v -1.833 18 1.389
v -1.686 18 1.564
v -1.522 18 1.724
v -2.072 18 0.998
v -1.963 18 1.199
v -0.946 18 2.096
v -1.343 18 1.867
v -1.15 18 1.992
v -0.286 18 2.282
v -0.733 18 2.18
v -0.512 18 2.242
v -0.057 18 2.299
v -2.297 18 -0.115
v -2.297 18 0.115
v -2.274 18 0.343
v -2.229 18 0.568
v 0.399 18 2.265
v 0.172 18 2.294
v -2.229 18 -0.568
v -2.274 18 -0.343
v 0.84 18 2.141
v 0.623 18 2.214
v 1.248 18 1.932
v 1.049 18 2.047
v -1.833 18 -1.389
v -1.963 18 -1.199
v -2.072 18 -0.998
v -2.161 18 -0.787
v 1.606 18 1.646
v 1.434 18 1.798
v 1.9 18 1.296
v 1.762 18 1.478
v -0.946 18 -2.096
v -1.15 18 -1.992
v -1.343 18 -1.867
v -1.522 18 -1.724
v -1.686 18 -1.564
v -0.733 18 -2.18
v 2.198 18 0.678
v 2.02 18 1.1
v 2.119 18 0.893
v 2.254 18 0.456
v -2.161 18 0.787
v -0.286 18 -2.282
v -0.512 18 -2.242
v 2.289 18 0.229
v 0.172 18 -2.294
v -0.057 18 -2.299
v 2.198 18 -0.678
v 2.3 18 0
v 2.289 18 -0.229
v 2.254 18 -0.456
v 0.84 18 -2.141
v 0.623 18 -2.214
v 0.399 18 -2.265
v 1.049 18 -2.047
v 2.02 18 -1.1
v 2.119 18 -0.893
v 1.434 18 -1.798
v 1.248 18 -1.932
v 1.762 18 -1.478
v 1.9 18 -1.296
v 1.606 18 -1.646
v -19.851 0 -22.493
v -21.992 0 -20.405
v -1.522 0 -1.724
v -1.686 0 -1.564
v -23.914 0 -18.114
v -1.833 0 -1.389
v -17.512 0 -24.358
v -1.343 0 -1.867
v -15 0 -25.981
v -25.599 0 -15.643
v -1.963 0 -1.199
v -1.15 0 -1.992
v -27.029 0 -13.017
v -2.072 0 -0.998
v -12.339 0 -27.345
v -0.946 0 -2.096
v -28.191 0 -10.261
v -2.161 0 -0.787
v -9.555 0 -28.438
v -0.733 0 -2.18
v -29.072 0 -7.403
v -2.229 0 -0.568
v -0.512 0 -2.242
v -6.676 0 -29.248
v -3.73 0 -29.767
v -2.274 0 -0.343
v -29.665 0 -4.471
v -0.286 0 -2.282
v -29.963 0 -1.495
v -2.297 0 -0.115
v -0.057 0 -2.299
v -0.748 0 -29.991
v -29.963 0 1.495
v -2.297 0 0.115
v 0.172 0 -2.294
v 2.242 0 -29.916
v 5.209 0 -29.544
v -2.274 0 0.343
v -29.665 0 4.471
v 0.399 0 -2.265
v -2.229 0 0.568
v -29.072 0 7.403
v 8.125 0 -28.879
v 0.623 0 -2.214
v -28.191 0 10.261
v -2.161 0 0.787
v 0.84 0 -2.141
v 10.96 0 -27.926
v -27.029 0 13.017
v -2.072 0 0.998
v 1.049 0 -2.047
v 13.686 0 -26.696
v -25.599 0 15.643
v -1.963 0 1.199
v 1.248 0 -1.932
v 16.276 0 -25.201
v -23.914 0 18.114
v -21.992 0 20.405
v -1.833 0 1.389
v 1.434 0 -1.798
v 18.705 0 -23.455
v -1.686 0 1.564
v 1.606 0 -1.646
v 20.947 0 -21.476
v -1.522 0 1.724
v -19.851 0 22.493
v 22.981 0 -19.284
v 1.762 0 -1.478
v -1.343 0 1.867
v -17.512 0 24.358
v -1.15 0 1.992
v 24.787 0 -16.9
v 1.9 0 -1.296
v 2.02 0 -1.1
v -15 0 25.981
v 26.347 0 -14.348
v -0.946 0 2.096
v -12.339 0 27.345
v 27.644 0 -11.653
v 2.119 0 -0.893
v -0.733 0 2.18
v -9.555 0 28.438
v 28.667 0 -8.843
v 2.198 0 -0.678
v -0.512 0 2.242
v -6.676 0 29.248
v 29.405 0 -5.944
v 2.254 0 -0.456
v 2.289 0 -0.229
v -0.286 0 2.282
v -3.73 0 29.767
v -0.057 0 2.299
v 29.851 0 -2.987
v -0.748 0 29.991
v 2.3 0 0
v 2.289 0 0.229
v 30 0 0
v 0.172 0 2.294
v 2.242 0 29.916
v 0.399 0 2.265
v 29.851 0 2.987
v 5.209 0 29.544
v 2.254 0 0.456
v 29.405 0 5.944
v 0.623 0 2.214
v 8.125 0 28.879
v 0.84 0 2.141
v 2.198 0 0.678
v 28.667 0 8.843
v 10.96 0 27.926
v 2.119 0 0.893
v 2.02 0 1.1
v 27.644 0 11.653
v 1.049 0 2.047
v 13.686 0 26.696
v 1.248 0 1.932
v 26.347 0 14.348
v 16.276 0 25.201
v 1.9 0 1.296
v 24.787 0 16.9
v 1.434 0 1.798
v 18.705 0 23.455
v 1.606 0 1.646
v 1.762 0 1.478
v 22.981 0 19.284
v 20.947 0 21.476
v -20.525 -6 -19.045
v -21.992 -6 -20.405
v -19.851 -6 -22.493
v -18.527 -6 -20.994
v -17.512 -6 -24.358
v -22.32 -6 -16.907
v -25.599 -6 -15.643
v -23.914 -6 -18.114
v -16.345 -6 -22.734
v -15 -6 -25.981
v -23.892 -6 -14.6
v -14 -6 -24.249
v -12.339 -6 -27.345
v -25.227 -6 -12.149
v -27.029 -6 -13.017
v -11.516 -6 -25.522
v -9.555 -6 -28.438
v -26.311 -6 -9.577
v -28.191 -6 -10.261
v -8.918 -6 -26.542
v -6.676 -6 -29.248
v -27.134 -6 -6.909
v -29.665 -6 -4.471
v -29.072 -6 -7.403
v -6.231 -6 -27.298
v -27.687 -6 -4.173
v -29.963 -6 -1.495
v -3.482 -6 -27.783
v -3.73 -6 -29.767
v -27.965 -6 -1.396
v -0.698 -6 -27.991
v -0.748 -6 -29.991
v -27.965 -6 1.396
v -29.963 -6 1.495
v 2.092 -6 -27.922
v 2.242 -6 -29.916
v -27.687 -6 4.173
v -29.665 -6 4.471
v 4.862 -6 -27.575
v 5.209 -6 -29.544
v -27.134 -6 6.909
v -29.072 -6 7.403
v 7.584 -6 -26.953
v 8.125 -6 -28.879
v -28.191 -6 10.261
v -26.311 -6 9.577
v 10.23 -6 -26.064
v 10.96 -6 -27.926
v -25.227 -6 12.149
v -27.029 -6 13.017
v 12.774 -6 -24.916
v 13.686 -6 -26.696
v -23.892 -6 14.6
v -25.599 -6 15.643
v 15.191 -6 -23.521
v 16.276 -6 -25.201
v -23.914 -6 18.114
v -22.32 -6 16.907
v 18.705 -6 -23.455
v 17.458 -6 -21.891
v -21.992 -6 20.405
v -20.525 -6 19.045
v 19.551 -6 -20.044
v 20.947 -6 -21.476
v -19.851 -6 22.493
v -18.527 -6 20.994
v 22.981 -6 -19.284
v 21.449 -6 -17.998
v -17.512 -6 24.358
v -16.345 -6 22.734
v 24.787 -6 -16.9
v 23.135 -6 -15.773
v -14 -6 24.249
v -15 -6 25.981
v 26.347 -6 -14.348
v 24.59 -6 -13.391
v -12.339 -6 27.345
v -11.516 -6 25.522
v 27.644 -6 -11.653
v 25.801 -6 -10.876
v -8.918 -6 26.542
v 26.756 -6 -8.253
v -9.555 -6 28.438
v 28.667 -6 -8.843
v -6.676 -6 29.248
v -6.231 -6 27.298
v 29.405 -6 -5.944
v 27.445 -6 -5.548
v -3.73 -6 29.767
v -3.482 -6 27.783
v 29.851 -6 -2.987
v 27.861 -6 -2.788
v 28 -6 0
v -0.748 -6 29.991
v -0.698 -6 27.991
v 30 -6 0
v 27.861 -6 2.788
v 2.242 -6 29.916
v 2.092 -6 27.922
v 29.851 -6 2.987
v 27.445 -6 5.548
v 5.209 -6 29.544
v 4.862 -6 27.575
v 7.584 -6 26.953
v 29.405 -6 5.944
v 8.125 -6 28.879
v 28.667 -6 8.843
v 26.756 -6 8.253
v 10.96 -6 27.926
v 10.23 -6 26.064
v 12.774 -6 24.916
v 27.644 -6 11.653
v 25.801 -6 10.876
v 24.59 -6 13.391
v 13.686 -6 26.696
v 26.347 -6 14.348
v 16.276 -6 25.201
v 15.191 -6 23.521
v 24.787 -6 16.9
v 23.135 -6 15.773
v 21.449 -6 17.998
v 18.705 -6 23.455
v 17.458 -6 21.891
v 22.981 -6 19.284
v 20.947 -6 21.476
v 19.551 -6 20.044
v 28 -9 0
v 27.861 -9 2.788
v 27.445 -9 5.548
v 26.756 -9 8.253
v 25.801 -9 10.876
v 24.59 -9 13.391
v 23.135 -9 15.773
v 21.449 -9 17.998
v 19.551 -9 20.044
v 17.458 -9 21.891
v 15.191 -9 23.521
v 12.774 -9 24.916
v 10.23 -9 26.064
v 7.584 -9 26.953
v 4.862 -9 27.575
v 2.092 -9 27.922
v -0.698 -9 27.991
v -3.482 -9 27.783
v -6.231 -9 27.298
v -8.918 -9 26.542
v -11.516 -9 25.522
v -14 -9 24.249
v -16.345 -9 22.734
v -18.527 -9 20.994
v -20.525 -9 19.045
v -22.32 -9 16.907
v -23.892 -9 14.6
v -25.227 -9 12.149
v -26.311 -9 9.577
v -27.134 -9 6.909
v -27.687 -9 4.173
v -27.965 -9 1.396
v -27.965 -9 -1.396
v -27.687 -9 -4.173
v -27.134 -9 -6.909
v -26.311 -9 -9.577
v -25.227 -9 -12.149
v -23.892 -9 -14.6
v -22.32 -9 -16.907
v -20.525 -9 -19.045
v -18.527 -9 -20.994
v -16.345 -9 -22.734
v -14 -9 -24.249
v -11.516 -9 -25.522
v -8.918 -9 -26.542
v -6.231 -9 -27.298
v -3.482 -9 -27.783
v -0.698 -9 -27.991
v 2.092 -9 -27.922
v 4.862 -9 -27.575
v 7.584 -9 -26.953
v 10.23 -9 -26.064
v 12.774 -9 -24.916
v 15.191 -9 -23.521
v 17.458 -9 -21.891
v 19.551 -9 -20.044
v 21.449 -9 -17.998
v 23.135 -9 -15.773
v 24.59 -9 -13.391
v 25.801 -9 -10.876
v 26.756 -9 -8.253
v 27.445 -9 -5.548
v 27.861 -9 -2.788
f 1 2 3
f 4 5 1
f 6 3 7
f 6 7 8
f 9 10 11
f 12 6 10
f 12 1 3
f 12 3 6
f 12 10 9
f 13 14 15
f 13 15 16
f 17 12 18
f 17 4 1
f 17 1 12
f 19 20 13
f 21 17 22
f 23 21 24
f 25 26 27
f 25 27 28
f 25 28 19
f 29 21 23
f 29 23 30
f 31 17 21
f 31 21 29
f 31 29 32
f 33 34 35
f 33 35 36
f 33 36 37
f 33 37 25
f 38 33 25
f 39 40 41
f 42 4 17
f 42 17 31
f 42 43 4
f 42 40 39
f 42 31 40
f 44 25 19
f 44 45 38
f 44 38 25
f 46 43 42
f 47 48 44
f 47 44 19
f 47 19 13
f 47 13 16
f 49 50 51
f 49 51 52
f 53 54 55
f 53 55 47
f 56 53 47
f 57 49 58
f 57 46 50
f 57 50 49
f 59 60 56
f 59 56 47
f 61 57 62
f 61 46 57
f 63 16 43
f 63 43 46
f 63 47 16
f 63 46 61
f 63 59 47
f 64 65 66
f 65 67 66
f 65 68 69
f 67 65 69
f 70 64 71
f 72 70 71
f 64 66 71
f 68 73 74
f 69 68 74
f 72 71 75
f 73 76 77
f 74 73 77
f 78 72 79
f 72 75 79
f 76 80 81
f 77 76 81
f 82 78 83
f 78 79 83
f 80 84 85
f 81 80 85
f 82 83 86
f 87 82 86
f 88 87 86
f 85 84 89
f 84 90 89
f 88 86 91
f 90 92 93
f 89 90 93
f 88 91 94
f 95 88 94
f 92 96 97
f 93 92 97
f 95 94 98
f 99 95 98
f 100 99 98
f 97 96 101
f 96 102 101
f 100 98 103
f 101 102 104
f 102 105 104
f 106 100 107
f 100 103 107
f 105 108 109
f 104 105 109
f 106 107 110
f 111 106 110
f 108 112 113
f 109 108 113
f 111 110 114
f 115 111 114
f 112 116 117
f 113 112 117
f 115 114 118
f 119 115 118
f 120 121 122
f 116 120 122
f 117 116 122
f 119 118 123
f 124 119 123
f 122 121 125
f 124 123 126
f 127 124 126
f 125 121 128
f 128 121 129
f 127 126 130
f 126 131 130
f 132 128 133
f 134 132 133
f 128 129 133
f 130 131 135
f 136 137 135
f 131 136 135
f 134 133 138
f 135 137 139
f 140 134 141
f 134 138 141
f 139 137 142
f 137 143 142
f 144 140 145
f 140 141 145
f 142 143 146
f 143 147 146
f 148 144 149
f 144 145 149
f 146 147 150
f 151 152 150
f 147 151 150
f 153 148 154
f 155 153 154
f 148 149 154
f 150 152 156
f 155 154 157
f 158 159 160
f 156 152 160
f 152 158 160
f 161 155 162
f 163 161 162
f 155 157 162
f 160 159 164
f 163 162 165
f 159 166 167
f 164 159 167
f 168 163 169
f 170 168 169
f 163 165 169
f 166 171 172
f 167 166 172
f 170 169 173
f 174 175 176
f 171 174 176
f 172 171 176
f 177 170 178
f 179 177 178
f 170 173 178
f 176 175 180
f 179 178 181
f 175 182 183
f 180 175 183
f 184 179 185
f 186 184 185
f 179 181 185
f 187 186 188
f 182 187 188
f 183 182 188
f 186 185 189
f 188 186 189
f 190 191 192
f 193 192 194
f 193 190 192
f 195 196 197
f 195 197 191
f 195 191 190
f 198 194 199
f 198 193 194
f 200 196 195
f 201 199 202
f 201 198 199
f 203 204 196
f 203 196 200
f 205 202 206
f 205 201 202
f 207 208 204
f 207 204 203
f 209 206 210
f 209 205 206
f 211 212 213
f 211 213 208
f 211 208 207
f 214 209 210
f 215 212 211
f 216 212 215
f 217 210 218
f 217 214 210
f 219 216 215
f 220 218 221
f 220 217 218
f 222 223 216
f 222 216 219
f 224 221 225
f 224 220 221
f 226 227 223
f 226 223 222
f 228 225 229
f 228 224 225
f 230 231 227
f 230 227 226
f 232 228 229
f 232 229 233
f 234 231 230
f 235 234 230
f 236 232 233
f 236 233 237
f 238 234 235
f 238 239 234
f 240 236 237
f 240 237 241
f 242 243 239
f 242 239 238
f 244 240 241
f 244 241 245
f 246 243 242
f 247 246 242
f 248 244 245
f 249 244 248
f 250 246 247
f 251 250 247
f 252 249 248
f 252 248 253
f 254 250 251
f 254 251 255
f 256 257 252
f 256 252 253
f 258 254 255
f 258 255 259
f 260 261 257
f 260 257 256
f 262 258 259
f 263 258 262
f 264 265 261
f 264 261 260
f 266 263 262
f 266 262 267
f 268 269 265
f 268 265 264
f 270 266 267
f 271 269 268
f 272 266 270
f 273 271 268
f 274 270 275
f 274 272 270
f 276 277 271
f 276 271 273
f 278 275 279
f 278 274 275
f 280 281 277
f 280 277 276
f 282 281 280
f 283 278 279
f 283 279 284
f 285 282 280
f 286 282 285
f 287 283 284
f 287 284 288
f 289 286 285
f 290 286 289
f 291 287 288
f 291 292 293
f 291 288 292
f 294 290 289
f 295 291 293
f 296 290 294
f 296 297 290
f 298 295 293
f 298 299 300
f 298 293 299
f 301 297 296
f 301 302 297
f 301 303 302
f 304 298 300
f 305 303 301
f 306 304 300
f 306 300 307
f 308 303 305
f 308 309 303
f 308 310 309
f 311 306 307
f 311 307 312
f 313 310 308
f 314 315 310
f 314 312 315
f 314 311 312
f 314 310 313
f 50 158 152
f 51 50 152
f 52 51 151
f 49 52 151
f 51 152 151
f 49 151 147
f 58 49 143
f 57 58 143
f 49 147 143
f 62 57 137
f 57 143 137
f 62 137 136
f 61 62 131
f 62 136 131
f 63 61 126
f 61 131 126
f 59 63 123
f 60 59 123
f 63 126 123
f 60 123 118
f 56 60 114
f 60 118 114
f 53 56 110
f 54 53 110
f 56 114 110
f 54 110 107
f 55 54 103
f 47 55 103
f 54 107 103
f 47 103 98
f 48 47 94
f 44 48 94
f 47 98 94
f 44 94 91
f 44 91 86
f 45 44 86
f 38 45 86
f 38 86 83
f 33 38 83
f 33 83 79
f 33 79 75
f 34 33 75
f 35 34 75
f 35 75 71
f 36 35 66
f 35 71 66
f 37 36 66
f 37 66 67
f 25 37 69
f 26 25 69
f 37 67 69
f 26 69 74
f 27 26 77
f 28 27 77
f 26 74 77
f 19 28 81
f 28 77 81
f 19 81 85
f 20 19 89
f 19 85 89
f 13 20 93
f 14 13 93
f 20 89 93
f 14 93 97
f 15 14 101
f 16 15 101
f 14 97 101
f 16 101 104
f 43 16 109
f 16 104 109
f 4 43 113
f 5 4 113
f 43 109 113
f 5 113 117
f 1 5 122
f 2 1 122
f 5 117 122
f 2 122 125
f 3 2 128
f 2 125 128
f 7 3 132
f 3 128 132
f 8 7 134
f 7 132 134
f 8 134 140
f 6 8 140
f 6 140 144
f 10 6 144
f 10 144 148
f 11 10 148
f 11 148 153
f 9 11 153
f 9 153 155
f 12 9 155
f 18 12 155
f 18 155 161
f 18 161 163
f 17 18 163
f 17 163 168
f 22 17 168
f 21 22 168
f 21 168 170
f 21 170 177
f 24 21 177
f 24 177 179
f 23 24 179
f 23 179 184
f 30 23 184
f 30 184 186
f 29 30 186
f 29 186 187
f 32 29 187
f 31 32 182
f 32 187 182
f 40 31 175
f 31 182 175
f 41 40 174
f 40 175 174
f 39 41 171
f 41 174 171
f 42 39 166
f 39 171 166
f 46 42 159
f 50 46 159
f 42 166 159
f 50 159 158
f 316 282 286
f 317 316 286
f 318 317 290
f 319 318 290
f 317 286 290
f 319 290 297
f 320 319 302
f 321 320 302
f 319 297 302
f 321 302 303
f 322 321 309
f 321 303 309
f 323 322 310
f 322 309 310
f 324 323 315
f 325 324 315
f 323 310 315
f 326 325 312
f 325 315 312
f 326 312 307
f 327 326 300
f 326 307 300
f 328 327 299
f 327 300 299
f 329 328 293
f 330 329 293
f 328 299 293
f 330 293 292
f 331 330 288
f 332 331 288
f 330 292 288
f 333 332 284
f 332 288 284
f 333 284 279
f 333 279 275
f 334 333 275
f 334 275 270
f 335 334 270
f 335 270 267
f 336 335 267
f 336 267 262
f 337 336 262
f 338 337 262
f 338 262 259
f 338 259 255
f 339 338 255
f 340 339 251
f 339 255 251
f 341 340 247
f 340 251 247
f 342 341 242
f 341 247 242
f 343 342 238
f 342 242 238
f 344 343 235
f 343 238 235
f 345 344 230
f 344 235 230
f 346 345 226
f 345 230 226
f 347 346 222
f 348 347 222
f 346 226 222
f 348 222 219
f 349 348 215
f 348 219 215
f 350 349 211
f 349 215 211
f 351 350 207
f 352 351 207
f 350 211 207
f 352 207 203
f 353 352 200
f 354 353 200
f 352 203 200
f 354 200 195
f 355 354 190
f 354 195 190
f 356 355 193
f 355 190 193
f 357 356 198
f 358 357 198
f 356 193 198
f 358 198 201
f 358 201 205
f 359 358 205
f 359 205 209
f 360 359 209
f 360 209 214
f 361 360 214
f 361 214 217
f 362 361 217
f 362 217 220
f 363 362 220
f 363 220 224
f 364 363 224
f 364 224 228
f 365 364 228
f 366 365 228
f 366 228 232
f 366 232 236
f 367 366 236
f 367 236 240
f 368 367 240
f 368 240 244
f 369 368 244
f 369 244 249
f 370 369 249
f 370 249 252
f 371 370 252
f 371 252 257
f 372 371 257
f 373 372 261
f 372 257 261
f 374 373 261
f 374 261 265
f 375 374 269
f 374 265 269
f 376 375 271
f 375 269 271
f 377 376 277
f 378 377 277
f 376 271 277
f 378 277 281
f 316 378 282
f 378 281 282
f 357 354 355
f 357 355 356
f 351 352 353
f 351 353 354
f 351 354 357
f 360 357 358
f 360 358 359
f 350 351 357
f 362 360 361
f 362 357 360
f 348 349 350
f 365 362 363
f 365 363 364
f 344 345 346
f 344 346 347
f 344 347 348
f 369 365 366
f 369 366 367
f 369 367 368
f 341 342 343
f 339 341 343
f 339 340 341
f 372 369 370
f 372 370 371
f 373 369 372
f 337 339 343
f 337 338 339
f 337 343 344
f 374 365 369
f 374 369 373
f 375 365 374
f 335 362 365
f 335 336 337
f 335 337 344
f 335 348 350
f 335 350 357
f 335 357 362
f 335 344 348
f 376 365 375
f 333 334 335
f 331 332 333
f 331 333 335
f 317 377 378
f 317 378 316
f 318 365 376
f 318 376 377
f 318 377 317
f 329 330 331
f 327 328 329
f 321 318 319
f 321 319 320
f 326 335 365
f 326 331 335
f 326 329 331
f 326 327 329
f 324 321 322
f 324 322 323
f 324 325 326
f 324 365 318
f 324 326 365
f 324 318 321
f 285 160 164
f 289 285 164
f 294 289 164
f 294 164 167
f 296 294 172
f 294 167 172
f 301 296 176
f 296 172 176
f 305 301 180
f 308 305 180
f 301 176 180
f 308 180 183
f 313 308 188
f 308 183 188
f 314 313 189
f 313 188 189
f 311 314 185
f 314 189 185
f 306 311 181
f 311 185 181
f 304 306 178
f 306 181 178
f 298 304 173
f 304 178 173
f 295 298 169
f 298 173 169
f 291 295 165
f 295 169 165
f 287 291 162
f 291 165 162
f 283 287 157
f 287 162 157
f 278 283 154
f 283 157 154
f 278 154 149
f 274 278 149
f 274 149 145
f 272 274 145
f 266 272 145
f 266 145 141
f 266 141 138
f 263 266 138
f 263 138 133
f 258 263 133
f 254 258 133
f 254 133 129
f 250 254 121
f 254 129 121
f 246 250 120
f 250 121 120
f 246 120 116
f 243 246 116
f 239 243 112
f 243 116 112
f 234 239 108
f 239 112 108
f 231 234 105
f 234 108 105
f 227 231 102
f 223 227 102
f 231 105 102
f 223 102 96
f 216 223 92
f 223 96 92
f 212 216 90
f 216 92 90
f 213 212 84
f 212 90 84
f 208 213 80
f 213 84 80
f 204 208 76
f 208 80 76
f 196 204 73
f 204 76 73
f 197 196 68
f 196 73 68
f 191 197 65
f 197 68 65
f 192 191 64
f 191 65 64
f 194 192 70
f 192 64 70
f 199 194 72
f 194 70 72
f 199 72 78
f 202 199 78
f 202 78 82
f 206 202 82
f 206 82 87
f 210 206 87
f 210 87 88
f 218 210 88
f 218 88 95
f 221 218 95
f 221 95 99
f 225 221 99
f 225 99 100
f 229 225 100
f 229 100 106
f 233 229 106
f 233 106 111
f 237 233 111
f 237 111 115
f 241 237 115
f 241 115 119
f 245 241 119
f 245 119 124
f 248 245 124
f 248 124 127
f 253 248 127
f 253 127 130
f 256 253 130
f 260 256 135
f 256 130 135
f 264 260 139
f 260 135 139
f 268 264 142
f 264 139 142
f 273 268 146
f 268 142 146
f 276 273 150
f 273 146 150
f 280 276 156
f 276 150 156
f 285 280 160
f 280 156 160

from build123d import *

# Parameters (mm, degrees)
SKETCH_R     = 30
PAD_DEPTH    = 6
SKETCH001_R  = 28
PAD001_DEPTH = 3
SKETCH002_R  = 2.3
PAD002_DEPTH = 18


with BuildPart() as part:
    # Sketch → Pad (new body)
    with BuildSketch(Plane.XZ):
        Circle(SKETCH_R)
    extrude(amount=PAD_DEPTH)

    # Sketch001 (on Face3 of Pad) → Pad001 (join)
    with BuildSketch(Plane.XZ.offset(6)):
        Circle(SKETCH001_R)
    extrude(amount=PAD001_DEPTH)

    # Sketch002 (on Face2 of Pad001) → Pad002 (join)
    with BuildSketch(Plane(origin=(0, 0, 0), x_dir=(1, 0, 0), z_dir=(0, 1, 0))):
        Circle(SKETCH002_R)
    extrude(amount=PAD002_DEPTH)


solid = part.part
